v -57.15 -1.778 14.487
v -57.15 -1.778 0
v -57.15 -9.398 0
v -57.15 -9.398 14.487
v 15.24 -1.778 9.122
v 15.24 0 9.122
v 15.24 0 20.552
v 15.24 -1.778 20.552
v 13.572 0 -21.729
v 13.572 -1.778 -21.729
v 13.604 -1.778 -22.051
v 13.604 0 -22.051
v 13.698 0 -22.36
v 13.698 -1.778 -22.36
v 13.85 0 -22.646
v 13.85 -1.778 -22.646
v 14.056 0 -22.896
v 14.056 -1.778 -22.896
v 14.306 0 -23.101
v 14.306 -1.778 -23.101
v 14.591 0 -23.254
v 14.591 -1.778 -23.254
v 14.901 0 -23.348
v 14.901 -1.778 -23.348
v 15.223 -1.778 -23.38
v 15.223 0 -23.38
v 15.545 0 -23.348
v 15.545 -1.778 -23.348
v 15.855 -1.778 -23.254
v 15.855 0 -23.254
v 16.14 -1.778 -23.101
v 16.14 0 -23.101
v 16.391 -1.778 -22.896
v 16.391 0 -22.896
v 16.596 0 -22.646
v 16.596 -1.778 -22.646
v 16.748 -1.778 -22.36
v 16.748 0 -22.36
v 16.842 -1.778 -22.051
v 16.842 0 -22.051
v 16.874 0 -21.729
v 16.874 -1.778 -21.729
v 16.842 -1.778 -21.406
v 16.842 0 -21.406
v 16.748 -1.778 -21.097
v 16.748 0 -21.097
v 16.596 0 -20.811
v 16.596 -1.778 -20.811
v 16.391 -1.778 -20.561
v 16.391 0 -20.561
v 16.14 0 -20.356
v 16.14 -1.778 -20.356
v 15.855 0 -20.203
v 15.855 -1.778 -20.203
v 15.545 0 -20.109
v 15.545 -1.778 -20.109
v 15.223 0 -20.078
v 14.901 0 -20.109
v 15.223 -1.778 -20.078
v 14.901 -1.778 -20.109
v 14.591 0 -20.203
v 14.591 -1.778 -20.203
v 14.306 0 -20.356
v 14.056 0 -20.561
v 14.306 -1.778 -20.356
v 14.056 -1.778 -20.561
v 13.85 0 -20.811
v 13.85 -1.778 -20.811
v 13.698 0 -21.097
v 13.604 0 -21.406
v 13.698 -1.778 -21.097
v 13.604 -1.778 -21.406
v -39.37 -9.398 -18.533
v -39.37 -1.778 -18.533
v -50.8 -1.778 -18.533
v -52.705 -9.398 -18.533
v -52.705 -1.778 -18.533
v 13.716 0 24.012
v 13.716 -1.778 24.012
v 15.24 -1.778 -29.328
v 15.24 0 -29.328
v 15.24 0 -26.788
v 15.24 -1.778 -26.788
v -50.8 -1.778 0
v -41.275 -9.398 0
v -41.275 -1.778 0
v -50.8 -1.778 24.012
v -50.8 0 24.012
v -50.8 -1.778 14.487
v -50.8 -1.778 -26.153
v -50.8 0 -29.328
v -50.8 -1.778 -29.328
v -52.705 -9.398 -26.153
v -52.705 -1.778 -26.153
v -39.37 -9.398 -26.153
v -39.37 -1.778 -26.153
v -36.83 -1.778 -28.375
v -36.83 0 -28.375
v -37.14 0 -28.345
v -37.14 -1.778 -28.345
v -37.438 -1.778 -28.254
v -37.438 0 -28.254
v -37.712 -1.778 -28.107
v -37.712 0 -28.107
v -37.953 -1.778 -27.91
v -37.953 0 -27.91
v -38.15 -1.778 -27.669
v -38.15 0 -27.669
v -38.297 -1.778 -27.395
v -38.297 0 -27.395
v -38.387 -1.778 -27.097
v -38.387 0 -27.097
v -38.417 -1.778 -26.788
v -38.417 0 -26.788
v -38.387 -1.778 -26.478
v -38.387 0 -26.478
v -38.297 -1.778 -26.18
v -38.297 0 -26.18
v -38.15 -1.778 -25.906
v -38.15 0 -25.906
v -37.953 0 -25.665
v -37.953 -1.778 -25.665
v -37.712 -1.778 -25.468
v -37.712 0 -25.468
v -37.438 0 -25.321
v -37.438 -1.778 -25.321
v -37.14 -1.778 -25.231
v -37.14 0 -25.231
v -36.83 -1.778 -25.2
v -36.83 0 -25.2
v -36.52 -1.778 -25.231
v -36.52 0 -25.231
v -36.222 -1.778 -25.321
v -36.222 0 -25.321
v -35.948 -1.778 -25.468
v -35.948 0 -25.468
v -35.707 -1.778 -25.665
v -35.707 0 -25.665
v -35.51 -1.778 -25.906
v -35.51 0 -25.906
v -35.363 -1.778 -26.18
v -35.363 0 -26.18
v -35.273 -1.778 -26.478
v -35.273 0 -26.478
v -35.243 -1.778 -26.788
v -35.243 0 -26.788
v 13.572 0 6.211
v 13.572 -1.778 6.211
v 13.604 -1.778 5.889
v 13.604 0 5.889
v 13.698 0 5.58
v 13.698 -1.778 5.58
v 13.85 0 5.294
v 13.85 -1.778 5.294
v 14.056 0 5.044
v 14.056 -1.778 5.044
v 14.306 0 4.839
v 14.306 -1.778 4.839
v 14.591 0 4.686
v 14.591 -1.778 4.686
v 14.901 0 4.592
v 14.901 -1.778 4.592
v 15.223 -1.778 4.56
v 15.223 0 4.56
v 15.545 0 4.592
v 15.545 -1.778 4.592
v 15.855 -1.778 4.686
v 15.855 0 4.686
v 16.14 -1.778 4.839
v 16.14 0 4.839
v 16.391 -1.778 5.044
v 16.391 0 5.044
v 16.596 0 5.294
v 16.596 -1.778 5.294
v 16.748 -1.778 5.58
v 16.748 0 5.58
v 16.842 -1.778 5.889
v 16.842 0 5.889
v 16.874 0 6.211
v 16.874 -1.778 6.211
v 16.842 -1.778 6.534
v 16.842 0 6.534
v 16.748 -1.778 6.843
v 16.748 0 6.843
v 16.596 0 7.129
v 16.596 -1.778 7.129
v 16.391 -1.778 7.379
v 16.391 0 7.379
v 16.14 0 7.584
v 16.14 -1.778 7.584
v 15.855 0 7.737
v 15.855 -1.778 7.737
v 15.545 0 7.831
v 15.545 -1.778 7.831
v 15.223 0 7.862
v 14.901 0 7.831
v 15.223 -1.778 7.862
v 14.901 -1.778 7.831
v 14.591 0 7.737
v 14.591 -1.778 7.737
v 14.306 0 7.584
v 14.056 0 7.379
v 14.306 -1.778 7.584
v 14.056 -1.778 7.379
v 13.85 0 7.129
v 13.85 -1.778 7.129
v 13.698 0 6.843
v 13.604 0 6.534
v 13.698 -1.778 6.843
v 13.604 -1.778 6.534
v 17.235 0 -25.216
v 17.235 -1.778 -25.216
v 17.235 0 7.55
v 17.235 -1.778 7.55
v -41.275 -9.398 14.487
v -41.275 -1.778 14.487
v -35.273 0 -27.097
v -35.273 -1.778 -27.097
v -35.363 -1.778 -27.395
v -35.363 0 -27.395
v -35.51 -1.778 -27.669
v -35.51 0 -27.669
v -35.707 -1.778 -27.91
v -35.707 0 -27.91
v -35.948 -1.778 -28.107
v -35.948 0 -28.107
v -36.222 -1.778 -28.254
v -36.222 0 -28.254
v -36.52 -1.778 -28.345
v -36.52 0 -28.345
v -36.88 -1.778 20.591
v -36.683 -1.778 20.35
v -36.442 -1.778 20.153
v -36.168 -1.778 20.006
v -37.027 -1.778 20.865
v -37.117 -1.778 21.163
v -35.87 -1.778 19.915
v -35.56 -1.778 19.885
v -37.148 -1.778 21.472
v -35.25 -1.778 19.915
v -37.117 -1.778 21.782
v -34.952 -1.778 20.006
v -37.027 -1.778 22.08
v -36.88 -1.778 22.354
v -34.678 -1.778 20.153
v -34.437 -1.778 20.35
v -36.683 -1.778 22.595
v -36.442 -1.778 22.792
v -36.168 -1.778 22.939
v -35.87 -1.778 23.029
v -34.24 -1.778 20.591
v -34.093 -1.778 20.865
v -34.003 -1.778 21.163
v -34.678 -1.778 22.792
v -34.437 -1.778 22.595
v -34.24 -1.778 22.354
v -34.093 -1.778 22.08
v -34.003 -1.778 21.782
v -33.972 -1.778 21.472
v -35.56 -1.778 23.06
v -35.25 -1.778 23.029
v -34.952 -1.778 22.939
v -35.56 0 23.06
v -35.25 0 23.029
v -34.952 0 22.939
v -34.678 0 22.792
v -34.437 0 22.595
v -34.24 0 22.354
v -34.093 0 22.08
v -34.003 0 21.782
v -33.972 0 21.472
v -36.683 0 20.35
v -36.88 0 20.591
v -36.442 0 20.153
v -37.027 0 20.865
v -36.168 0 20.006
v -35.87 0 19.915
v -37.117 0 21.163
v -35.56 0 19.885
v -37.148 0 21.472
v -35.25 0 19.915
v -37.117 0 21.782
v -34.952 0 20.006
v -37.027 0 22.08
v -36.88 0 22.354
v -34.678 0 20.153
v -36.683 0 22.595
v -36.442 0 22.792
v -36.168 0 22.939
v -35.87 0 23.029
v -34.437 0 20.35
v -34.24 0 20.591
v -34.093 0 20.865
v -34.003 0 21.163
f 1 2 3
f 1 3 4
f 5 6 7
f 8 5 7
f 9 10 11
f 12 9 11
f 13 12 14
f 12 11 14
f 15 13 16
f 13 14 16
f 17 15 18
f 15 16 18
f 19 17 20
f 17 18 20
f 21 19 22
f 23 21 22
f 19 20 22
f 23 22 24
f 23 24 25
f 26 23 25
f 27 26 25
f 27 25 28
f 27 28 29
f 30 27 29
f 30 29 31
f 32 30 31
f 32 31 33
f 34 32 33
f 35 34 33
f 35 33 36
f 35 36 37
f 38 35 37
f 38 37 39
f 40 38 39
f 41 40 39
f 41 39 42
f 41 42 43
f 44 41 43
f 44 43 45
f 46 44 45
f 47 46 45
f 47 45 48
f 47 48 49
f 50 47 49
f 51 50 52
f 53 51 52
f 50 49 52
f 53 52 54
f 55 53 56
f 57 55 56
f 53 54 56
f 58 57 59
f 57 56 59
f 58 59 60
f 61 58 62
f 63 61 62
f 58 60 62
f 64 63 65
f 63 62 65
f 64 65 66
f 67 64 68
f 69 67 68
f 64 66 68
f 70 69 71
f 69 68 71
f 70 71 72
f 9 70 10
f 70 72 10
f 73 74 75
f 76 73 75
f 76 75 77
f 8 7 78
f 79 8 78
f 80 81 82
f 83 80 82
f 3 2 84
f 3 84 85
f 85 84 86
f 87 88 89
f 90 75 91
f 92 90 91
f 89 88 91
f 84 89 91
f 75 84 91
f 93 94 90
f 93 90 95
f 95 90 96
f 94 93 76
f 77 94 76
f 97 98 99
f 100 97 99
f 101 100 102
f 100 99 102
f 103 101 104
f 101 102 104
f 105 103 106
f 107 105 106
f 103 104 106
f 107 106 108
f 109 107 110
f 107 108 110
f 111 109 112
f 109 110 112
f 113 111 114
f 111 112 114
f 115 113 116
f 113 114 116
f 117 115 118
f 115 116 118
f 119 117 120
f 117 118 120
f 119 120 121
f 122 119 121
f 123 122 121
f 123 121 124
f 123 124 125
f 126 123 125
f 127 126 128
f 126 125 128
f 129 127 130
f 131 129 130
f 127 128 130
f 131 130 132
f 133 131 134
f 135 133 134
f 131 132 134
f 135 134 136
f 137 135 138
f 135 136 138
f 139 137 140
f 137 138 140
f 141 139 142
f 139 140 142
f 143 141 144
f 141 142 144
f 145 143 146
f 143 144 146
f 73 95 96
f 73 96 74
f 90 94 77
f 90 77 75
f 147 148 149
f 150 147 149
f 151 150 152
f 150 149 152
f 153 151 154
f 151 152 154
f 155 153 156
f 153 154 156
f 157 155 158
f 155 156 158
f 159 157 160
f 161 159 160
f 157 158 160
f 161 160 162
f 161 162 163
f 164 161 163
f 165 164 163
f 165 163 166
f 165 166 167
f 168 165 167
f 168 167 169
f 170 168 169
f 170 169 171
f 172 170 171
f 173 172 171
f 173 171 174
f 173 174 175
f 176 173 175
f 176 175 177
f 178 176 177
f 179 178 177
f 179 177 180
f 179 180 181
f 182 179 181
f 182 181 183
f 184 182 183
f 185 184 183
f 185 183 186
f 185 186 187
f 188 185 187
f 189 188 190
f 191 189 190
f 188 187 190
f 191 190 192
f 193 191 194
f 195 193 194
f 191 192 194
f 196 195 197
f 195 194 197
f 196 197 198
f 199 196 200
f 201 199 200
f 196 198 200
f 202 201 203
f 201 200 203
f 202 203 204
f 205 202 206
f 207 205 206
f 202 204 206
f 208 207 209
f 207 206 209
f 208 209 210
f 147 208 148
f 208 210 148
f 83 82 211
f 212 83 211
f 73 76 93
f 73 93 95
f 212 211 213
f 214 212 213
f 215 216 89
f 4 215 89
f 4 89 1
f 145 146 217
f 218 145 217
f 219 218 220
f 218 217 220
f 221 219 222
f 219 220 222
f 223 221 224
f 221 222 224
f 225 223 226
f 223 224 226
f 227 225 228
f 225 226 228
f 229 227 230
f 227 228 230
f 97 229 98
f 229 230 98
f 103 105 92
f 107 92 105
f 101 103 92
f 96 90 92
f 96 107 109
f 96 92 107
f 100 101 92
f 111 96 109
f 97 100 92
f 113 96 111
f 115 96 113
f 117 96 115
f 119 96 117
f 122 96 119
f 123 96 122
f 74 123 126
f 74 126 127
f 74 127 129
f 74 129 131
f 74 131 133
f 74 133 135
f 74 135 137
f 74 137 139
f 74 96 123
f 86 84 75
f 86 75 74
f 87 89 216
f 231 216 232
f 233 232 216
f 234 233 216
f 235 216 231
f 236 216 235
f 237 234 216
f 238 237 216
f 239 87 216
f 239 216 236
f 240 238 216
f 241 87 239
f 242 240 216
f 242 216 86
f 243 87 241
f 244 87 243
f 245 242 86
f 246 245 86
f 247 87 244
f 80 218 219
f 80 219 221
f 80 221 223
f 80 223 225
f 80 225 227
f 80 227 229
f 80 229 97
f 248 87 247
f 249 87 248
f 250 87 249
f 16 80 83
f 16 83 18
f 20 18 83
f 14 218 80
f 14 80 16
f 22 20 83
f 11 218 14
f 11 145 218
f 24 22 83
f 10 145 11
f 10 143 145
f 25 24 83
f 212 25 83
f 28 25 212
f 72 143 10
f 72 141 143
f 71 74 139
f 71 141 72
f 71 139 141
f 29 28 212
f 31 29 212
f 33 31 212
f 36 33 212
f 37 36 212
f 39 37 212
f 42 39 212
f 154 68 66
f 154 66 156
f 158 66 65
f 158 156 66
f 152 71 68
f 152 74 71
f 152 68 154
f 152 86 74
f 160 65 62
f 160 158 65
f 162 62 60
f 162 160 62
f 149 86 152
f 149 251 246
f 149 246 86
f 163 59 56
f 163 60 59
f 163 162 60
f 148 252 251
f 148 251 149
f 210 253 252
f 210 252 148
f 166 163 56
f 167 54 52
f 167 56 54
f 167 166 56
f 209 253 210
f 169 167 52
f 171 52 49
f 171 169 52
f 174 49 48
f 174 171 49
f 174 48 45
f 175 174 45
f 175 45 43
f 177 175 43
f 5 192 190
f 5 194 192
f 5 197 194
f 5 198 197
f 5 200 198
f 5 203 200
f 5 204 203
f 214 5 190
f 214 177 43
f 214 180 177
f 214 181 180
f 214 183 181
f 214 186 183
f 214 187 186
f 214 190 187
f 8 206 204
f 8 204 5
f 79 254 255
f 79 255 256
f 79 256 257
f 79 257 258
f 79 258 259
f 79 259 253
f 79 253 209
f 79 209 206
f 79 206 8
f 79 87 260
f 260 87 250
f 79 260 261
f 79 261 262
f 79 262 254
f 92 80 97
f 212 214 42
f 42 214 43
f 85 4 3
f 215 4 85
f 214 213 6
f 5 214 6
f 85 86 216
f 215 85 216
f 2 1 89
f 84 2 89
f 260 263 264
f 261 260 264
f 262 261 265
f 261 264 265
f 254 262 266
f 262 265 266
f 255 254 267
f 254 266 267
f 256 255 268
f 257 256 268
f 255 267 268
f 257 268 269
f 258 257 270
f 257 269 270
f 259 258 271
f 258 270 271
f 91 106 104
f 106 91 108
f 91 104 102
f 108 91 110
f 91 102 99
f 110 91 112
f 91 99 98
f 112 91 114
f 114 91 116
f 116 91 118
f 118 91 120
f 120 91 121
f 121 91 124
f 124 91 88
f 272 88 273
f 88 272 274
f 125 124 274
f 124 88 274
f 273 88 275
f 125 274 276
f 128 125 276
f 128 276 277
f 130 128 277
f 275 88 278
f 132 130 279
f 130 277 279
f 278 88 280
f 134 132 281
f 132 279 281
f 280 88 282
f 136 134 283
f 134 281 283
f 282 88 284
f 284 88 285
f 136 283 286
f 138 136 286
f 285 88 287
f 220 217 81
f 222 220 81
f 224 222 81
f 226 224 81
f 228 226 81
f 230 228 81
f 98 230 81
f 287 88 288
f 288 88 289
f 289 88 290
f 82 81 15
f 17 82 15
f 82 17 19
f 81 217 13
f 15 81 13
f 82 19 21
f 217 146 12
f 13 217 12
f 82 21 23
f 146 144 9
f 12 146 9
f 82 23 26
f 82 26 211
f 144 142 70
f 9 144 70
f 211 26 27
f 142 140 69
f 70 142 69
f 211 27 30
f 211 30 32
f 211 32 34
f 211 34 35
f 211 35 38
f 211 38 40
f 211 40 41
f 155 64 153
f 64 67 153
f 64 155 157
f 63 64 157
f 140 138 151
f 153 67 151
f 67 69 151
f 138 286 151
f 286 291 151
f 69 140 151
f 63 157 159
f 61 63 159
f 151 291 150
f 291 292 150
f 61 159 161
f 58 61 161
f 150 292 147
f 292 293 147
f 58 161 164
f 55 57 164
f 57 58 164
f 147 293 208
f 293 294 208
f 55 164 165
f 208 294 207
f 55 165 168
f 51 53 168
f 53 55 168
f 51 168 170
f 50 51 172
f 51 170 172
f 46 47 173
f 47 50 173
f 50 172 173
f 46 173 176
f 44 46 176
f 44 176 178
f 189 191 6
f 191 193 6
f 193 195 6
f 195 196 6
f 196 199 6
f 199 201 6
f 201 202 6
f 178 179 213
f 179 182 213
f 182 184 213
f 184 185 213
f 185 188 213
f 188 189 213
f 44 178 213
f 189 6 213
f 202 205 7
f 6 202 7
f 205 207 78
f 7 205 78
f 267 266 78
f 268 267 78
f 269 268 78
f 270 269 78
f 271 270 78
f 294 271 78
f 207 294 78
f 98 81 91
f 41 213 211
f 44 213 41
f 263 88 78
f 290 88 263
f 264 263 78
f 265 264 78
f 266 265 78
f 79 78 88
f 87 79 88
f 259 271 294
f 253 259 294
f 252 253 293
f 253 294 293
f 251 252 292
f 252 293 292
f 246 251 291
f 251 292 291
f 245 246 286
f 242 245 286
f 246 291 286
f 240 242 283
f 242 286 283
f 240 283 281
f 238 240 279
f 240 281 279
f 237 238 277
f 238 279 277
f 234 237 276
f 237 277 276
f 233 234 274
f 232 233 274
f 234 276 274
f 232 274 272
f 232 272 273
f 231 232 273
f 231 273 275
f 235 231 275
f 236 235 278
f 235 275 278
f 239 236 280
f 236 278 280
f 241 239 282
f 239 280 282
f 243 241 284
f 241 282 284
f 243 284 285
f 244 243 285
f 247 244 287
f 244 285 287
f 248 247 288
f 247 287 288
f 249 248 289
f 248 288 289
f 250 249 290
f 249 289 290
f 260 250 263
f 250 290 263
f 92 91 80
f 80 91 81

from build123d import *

# Parameters (mm, degrees)
F2_DEPTH = 1.778
F3_D     = 3.302
F4_W     = 6.35
F4_H     = 14.4874919379
F4_W_2   = 9.525
F4_W_3   = 11.43
F4_H_2   = 7.62
F4_W_4   = 1.905
F5_DEPTH = 7.62


with BuildPart() as f2:
    # F0 (on Front) → F2 (new body)
    with BuildSketch(Plane.XZ):
        Polygon((-50.8, 24.0124919379), (-50.8, -29.3275080621), (-36.83, -29.3275080621), (0, -29.3275080621), (15.24, -29.3275080621), (15.24, -26.7875080621), (17.235215947, -25.2156577751), (17.235215947, 7.5503422249), (15.24, 9.122192512), (15.24, 20.552192512), (13.716, 24.0124919379), (-35.56, 24.0124919379), align=None)
        with BuildLine():
            ThreePointArc((-35.2425, -26.7875080621), (-35.7074679849, -27.9100400773), (-36.83, -28.3750080621))
            ThreePointArc((-36.83, -28.3750080621), (-37.9525320151, -25.664976047), (-35.2425, -26.7875080621))
        make_face(mode=Mode.SUBTRACT)
        with BuildLine():
            ThreePointArc((-33.9725, 21.4724919379), (-36.6825320151, 20.3499599227), (-35.56, 23.0599919379))
            ThreePointArc((-35.56, 23.0599919379), (-34.4374679849, 22.595023953), (-33.9725, 21.4724919379))
        make_face(mode=Mode.SUBTRACT)
    extrude(amount=F2_DEPTH)

    # F3 (through all)
    with Locations(Plane(origin=(0, 0, 0), x_dir=(1, 0, 0), z_dir=(0, 1, 0))):
        with Locations((15.2230756357, 21.728583892), (15.2230756357, -6.211416108)):
            Hole(F3_D / 2)

    # F4 (on face) → F5 (join)
    with BuildSketch(Plane.XZ.offset(1.778)):
        with Locations((-53.975, 7.2437459689)):
            Rectangle(F4_W, F4_H)
        with Locations((-46.0375, 7.2437459689)):
            Rectangle(F4_W_2, F4_H)
        with Locations((-45.085, -22.3425080621)):
            Rectangle(F4_W_3, F4_H_2)
        with Locations((-51.7525, -22.3425080621)):
            Rectangle(F4_W_4, F4_H_2)
    extrude(amount=F5_DEPTH)


solid = f2.part
